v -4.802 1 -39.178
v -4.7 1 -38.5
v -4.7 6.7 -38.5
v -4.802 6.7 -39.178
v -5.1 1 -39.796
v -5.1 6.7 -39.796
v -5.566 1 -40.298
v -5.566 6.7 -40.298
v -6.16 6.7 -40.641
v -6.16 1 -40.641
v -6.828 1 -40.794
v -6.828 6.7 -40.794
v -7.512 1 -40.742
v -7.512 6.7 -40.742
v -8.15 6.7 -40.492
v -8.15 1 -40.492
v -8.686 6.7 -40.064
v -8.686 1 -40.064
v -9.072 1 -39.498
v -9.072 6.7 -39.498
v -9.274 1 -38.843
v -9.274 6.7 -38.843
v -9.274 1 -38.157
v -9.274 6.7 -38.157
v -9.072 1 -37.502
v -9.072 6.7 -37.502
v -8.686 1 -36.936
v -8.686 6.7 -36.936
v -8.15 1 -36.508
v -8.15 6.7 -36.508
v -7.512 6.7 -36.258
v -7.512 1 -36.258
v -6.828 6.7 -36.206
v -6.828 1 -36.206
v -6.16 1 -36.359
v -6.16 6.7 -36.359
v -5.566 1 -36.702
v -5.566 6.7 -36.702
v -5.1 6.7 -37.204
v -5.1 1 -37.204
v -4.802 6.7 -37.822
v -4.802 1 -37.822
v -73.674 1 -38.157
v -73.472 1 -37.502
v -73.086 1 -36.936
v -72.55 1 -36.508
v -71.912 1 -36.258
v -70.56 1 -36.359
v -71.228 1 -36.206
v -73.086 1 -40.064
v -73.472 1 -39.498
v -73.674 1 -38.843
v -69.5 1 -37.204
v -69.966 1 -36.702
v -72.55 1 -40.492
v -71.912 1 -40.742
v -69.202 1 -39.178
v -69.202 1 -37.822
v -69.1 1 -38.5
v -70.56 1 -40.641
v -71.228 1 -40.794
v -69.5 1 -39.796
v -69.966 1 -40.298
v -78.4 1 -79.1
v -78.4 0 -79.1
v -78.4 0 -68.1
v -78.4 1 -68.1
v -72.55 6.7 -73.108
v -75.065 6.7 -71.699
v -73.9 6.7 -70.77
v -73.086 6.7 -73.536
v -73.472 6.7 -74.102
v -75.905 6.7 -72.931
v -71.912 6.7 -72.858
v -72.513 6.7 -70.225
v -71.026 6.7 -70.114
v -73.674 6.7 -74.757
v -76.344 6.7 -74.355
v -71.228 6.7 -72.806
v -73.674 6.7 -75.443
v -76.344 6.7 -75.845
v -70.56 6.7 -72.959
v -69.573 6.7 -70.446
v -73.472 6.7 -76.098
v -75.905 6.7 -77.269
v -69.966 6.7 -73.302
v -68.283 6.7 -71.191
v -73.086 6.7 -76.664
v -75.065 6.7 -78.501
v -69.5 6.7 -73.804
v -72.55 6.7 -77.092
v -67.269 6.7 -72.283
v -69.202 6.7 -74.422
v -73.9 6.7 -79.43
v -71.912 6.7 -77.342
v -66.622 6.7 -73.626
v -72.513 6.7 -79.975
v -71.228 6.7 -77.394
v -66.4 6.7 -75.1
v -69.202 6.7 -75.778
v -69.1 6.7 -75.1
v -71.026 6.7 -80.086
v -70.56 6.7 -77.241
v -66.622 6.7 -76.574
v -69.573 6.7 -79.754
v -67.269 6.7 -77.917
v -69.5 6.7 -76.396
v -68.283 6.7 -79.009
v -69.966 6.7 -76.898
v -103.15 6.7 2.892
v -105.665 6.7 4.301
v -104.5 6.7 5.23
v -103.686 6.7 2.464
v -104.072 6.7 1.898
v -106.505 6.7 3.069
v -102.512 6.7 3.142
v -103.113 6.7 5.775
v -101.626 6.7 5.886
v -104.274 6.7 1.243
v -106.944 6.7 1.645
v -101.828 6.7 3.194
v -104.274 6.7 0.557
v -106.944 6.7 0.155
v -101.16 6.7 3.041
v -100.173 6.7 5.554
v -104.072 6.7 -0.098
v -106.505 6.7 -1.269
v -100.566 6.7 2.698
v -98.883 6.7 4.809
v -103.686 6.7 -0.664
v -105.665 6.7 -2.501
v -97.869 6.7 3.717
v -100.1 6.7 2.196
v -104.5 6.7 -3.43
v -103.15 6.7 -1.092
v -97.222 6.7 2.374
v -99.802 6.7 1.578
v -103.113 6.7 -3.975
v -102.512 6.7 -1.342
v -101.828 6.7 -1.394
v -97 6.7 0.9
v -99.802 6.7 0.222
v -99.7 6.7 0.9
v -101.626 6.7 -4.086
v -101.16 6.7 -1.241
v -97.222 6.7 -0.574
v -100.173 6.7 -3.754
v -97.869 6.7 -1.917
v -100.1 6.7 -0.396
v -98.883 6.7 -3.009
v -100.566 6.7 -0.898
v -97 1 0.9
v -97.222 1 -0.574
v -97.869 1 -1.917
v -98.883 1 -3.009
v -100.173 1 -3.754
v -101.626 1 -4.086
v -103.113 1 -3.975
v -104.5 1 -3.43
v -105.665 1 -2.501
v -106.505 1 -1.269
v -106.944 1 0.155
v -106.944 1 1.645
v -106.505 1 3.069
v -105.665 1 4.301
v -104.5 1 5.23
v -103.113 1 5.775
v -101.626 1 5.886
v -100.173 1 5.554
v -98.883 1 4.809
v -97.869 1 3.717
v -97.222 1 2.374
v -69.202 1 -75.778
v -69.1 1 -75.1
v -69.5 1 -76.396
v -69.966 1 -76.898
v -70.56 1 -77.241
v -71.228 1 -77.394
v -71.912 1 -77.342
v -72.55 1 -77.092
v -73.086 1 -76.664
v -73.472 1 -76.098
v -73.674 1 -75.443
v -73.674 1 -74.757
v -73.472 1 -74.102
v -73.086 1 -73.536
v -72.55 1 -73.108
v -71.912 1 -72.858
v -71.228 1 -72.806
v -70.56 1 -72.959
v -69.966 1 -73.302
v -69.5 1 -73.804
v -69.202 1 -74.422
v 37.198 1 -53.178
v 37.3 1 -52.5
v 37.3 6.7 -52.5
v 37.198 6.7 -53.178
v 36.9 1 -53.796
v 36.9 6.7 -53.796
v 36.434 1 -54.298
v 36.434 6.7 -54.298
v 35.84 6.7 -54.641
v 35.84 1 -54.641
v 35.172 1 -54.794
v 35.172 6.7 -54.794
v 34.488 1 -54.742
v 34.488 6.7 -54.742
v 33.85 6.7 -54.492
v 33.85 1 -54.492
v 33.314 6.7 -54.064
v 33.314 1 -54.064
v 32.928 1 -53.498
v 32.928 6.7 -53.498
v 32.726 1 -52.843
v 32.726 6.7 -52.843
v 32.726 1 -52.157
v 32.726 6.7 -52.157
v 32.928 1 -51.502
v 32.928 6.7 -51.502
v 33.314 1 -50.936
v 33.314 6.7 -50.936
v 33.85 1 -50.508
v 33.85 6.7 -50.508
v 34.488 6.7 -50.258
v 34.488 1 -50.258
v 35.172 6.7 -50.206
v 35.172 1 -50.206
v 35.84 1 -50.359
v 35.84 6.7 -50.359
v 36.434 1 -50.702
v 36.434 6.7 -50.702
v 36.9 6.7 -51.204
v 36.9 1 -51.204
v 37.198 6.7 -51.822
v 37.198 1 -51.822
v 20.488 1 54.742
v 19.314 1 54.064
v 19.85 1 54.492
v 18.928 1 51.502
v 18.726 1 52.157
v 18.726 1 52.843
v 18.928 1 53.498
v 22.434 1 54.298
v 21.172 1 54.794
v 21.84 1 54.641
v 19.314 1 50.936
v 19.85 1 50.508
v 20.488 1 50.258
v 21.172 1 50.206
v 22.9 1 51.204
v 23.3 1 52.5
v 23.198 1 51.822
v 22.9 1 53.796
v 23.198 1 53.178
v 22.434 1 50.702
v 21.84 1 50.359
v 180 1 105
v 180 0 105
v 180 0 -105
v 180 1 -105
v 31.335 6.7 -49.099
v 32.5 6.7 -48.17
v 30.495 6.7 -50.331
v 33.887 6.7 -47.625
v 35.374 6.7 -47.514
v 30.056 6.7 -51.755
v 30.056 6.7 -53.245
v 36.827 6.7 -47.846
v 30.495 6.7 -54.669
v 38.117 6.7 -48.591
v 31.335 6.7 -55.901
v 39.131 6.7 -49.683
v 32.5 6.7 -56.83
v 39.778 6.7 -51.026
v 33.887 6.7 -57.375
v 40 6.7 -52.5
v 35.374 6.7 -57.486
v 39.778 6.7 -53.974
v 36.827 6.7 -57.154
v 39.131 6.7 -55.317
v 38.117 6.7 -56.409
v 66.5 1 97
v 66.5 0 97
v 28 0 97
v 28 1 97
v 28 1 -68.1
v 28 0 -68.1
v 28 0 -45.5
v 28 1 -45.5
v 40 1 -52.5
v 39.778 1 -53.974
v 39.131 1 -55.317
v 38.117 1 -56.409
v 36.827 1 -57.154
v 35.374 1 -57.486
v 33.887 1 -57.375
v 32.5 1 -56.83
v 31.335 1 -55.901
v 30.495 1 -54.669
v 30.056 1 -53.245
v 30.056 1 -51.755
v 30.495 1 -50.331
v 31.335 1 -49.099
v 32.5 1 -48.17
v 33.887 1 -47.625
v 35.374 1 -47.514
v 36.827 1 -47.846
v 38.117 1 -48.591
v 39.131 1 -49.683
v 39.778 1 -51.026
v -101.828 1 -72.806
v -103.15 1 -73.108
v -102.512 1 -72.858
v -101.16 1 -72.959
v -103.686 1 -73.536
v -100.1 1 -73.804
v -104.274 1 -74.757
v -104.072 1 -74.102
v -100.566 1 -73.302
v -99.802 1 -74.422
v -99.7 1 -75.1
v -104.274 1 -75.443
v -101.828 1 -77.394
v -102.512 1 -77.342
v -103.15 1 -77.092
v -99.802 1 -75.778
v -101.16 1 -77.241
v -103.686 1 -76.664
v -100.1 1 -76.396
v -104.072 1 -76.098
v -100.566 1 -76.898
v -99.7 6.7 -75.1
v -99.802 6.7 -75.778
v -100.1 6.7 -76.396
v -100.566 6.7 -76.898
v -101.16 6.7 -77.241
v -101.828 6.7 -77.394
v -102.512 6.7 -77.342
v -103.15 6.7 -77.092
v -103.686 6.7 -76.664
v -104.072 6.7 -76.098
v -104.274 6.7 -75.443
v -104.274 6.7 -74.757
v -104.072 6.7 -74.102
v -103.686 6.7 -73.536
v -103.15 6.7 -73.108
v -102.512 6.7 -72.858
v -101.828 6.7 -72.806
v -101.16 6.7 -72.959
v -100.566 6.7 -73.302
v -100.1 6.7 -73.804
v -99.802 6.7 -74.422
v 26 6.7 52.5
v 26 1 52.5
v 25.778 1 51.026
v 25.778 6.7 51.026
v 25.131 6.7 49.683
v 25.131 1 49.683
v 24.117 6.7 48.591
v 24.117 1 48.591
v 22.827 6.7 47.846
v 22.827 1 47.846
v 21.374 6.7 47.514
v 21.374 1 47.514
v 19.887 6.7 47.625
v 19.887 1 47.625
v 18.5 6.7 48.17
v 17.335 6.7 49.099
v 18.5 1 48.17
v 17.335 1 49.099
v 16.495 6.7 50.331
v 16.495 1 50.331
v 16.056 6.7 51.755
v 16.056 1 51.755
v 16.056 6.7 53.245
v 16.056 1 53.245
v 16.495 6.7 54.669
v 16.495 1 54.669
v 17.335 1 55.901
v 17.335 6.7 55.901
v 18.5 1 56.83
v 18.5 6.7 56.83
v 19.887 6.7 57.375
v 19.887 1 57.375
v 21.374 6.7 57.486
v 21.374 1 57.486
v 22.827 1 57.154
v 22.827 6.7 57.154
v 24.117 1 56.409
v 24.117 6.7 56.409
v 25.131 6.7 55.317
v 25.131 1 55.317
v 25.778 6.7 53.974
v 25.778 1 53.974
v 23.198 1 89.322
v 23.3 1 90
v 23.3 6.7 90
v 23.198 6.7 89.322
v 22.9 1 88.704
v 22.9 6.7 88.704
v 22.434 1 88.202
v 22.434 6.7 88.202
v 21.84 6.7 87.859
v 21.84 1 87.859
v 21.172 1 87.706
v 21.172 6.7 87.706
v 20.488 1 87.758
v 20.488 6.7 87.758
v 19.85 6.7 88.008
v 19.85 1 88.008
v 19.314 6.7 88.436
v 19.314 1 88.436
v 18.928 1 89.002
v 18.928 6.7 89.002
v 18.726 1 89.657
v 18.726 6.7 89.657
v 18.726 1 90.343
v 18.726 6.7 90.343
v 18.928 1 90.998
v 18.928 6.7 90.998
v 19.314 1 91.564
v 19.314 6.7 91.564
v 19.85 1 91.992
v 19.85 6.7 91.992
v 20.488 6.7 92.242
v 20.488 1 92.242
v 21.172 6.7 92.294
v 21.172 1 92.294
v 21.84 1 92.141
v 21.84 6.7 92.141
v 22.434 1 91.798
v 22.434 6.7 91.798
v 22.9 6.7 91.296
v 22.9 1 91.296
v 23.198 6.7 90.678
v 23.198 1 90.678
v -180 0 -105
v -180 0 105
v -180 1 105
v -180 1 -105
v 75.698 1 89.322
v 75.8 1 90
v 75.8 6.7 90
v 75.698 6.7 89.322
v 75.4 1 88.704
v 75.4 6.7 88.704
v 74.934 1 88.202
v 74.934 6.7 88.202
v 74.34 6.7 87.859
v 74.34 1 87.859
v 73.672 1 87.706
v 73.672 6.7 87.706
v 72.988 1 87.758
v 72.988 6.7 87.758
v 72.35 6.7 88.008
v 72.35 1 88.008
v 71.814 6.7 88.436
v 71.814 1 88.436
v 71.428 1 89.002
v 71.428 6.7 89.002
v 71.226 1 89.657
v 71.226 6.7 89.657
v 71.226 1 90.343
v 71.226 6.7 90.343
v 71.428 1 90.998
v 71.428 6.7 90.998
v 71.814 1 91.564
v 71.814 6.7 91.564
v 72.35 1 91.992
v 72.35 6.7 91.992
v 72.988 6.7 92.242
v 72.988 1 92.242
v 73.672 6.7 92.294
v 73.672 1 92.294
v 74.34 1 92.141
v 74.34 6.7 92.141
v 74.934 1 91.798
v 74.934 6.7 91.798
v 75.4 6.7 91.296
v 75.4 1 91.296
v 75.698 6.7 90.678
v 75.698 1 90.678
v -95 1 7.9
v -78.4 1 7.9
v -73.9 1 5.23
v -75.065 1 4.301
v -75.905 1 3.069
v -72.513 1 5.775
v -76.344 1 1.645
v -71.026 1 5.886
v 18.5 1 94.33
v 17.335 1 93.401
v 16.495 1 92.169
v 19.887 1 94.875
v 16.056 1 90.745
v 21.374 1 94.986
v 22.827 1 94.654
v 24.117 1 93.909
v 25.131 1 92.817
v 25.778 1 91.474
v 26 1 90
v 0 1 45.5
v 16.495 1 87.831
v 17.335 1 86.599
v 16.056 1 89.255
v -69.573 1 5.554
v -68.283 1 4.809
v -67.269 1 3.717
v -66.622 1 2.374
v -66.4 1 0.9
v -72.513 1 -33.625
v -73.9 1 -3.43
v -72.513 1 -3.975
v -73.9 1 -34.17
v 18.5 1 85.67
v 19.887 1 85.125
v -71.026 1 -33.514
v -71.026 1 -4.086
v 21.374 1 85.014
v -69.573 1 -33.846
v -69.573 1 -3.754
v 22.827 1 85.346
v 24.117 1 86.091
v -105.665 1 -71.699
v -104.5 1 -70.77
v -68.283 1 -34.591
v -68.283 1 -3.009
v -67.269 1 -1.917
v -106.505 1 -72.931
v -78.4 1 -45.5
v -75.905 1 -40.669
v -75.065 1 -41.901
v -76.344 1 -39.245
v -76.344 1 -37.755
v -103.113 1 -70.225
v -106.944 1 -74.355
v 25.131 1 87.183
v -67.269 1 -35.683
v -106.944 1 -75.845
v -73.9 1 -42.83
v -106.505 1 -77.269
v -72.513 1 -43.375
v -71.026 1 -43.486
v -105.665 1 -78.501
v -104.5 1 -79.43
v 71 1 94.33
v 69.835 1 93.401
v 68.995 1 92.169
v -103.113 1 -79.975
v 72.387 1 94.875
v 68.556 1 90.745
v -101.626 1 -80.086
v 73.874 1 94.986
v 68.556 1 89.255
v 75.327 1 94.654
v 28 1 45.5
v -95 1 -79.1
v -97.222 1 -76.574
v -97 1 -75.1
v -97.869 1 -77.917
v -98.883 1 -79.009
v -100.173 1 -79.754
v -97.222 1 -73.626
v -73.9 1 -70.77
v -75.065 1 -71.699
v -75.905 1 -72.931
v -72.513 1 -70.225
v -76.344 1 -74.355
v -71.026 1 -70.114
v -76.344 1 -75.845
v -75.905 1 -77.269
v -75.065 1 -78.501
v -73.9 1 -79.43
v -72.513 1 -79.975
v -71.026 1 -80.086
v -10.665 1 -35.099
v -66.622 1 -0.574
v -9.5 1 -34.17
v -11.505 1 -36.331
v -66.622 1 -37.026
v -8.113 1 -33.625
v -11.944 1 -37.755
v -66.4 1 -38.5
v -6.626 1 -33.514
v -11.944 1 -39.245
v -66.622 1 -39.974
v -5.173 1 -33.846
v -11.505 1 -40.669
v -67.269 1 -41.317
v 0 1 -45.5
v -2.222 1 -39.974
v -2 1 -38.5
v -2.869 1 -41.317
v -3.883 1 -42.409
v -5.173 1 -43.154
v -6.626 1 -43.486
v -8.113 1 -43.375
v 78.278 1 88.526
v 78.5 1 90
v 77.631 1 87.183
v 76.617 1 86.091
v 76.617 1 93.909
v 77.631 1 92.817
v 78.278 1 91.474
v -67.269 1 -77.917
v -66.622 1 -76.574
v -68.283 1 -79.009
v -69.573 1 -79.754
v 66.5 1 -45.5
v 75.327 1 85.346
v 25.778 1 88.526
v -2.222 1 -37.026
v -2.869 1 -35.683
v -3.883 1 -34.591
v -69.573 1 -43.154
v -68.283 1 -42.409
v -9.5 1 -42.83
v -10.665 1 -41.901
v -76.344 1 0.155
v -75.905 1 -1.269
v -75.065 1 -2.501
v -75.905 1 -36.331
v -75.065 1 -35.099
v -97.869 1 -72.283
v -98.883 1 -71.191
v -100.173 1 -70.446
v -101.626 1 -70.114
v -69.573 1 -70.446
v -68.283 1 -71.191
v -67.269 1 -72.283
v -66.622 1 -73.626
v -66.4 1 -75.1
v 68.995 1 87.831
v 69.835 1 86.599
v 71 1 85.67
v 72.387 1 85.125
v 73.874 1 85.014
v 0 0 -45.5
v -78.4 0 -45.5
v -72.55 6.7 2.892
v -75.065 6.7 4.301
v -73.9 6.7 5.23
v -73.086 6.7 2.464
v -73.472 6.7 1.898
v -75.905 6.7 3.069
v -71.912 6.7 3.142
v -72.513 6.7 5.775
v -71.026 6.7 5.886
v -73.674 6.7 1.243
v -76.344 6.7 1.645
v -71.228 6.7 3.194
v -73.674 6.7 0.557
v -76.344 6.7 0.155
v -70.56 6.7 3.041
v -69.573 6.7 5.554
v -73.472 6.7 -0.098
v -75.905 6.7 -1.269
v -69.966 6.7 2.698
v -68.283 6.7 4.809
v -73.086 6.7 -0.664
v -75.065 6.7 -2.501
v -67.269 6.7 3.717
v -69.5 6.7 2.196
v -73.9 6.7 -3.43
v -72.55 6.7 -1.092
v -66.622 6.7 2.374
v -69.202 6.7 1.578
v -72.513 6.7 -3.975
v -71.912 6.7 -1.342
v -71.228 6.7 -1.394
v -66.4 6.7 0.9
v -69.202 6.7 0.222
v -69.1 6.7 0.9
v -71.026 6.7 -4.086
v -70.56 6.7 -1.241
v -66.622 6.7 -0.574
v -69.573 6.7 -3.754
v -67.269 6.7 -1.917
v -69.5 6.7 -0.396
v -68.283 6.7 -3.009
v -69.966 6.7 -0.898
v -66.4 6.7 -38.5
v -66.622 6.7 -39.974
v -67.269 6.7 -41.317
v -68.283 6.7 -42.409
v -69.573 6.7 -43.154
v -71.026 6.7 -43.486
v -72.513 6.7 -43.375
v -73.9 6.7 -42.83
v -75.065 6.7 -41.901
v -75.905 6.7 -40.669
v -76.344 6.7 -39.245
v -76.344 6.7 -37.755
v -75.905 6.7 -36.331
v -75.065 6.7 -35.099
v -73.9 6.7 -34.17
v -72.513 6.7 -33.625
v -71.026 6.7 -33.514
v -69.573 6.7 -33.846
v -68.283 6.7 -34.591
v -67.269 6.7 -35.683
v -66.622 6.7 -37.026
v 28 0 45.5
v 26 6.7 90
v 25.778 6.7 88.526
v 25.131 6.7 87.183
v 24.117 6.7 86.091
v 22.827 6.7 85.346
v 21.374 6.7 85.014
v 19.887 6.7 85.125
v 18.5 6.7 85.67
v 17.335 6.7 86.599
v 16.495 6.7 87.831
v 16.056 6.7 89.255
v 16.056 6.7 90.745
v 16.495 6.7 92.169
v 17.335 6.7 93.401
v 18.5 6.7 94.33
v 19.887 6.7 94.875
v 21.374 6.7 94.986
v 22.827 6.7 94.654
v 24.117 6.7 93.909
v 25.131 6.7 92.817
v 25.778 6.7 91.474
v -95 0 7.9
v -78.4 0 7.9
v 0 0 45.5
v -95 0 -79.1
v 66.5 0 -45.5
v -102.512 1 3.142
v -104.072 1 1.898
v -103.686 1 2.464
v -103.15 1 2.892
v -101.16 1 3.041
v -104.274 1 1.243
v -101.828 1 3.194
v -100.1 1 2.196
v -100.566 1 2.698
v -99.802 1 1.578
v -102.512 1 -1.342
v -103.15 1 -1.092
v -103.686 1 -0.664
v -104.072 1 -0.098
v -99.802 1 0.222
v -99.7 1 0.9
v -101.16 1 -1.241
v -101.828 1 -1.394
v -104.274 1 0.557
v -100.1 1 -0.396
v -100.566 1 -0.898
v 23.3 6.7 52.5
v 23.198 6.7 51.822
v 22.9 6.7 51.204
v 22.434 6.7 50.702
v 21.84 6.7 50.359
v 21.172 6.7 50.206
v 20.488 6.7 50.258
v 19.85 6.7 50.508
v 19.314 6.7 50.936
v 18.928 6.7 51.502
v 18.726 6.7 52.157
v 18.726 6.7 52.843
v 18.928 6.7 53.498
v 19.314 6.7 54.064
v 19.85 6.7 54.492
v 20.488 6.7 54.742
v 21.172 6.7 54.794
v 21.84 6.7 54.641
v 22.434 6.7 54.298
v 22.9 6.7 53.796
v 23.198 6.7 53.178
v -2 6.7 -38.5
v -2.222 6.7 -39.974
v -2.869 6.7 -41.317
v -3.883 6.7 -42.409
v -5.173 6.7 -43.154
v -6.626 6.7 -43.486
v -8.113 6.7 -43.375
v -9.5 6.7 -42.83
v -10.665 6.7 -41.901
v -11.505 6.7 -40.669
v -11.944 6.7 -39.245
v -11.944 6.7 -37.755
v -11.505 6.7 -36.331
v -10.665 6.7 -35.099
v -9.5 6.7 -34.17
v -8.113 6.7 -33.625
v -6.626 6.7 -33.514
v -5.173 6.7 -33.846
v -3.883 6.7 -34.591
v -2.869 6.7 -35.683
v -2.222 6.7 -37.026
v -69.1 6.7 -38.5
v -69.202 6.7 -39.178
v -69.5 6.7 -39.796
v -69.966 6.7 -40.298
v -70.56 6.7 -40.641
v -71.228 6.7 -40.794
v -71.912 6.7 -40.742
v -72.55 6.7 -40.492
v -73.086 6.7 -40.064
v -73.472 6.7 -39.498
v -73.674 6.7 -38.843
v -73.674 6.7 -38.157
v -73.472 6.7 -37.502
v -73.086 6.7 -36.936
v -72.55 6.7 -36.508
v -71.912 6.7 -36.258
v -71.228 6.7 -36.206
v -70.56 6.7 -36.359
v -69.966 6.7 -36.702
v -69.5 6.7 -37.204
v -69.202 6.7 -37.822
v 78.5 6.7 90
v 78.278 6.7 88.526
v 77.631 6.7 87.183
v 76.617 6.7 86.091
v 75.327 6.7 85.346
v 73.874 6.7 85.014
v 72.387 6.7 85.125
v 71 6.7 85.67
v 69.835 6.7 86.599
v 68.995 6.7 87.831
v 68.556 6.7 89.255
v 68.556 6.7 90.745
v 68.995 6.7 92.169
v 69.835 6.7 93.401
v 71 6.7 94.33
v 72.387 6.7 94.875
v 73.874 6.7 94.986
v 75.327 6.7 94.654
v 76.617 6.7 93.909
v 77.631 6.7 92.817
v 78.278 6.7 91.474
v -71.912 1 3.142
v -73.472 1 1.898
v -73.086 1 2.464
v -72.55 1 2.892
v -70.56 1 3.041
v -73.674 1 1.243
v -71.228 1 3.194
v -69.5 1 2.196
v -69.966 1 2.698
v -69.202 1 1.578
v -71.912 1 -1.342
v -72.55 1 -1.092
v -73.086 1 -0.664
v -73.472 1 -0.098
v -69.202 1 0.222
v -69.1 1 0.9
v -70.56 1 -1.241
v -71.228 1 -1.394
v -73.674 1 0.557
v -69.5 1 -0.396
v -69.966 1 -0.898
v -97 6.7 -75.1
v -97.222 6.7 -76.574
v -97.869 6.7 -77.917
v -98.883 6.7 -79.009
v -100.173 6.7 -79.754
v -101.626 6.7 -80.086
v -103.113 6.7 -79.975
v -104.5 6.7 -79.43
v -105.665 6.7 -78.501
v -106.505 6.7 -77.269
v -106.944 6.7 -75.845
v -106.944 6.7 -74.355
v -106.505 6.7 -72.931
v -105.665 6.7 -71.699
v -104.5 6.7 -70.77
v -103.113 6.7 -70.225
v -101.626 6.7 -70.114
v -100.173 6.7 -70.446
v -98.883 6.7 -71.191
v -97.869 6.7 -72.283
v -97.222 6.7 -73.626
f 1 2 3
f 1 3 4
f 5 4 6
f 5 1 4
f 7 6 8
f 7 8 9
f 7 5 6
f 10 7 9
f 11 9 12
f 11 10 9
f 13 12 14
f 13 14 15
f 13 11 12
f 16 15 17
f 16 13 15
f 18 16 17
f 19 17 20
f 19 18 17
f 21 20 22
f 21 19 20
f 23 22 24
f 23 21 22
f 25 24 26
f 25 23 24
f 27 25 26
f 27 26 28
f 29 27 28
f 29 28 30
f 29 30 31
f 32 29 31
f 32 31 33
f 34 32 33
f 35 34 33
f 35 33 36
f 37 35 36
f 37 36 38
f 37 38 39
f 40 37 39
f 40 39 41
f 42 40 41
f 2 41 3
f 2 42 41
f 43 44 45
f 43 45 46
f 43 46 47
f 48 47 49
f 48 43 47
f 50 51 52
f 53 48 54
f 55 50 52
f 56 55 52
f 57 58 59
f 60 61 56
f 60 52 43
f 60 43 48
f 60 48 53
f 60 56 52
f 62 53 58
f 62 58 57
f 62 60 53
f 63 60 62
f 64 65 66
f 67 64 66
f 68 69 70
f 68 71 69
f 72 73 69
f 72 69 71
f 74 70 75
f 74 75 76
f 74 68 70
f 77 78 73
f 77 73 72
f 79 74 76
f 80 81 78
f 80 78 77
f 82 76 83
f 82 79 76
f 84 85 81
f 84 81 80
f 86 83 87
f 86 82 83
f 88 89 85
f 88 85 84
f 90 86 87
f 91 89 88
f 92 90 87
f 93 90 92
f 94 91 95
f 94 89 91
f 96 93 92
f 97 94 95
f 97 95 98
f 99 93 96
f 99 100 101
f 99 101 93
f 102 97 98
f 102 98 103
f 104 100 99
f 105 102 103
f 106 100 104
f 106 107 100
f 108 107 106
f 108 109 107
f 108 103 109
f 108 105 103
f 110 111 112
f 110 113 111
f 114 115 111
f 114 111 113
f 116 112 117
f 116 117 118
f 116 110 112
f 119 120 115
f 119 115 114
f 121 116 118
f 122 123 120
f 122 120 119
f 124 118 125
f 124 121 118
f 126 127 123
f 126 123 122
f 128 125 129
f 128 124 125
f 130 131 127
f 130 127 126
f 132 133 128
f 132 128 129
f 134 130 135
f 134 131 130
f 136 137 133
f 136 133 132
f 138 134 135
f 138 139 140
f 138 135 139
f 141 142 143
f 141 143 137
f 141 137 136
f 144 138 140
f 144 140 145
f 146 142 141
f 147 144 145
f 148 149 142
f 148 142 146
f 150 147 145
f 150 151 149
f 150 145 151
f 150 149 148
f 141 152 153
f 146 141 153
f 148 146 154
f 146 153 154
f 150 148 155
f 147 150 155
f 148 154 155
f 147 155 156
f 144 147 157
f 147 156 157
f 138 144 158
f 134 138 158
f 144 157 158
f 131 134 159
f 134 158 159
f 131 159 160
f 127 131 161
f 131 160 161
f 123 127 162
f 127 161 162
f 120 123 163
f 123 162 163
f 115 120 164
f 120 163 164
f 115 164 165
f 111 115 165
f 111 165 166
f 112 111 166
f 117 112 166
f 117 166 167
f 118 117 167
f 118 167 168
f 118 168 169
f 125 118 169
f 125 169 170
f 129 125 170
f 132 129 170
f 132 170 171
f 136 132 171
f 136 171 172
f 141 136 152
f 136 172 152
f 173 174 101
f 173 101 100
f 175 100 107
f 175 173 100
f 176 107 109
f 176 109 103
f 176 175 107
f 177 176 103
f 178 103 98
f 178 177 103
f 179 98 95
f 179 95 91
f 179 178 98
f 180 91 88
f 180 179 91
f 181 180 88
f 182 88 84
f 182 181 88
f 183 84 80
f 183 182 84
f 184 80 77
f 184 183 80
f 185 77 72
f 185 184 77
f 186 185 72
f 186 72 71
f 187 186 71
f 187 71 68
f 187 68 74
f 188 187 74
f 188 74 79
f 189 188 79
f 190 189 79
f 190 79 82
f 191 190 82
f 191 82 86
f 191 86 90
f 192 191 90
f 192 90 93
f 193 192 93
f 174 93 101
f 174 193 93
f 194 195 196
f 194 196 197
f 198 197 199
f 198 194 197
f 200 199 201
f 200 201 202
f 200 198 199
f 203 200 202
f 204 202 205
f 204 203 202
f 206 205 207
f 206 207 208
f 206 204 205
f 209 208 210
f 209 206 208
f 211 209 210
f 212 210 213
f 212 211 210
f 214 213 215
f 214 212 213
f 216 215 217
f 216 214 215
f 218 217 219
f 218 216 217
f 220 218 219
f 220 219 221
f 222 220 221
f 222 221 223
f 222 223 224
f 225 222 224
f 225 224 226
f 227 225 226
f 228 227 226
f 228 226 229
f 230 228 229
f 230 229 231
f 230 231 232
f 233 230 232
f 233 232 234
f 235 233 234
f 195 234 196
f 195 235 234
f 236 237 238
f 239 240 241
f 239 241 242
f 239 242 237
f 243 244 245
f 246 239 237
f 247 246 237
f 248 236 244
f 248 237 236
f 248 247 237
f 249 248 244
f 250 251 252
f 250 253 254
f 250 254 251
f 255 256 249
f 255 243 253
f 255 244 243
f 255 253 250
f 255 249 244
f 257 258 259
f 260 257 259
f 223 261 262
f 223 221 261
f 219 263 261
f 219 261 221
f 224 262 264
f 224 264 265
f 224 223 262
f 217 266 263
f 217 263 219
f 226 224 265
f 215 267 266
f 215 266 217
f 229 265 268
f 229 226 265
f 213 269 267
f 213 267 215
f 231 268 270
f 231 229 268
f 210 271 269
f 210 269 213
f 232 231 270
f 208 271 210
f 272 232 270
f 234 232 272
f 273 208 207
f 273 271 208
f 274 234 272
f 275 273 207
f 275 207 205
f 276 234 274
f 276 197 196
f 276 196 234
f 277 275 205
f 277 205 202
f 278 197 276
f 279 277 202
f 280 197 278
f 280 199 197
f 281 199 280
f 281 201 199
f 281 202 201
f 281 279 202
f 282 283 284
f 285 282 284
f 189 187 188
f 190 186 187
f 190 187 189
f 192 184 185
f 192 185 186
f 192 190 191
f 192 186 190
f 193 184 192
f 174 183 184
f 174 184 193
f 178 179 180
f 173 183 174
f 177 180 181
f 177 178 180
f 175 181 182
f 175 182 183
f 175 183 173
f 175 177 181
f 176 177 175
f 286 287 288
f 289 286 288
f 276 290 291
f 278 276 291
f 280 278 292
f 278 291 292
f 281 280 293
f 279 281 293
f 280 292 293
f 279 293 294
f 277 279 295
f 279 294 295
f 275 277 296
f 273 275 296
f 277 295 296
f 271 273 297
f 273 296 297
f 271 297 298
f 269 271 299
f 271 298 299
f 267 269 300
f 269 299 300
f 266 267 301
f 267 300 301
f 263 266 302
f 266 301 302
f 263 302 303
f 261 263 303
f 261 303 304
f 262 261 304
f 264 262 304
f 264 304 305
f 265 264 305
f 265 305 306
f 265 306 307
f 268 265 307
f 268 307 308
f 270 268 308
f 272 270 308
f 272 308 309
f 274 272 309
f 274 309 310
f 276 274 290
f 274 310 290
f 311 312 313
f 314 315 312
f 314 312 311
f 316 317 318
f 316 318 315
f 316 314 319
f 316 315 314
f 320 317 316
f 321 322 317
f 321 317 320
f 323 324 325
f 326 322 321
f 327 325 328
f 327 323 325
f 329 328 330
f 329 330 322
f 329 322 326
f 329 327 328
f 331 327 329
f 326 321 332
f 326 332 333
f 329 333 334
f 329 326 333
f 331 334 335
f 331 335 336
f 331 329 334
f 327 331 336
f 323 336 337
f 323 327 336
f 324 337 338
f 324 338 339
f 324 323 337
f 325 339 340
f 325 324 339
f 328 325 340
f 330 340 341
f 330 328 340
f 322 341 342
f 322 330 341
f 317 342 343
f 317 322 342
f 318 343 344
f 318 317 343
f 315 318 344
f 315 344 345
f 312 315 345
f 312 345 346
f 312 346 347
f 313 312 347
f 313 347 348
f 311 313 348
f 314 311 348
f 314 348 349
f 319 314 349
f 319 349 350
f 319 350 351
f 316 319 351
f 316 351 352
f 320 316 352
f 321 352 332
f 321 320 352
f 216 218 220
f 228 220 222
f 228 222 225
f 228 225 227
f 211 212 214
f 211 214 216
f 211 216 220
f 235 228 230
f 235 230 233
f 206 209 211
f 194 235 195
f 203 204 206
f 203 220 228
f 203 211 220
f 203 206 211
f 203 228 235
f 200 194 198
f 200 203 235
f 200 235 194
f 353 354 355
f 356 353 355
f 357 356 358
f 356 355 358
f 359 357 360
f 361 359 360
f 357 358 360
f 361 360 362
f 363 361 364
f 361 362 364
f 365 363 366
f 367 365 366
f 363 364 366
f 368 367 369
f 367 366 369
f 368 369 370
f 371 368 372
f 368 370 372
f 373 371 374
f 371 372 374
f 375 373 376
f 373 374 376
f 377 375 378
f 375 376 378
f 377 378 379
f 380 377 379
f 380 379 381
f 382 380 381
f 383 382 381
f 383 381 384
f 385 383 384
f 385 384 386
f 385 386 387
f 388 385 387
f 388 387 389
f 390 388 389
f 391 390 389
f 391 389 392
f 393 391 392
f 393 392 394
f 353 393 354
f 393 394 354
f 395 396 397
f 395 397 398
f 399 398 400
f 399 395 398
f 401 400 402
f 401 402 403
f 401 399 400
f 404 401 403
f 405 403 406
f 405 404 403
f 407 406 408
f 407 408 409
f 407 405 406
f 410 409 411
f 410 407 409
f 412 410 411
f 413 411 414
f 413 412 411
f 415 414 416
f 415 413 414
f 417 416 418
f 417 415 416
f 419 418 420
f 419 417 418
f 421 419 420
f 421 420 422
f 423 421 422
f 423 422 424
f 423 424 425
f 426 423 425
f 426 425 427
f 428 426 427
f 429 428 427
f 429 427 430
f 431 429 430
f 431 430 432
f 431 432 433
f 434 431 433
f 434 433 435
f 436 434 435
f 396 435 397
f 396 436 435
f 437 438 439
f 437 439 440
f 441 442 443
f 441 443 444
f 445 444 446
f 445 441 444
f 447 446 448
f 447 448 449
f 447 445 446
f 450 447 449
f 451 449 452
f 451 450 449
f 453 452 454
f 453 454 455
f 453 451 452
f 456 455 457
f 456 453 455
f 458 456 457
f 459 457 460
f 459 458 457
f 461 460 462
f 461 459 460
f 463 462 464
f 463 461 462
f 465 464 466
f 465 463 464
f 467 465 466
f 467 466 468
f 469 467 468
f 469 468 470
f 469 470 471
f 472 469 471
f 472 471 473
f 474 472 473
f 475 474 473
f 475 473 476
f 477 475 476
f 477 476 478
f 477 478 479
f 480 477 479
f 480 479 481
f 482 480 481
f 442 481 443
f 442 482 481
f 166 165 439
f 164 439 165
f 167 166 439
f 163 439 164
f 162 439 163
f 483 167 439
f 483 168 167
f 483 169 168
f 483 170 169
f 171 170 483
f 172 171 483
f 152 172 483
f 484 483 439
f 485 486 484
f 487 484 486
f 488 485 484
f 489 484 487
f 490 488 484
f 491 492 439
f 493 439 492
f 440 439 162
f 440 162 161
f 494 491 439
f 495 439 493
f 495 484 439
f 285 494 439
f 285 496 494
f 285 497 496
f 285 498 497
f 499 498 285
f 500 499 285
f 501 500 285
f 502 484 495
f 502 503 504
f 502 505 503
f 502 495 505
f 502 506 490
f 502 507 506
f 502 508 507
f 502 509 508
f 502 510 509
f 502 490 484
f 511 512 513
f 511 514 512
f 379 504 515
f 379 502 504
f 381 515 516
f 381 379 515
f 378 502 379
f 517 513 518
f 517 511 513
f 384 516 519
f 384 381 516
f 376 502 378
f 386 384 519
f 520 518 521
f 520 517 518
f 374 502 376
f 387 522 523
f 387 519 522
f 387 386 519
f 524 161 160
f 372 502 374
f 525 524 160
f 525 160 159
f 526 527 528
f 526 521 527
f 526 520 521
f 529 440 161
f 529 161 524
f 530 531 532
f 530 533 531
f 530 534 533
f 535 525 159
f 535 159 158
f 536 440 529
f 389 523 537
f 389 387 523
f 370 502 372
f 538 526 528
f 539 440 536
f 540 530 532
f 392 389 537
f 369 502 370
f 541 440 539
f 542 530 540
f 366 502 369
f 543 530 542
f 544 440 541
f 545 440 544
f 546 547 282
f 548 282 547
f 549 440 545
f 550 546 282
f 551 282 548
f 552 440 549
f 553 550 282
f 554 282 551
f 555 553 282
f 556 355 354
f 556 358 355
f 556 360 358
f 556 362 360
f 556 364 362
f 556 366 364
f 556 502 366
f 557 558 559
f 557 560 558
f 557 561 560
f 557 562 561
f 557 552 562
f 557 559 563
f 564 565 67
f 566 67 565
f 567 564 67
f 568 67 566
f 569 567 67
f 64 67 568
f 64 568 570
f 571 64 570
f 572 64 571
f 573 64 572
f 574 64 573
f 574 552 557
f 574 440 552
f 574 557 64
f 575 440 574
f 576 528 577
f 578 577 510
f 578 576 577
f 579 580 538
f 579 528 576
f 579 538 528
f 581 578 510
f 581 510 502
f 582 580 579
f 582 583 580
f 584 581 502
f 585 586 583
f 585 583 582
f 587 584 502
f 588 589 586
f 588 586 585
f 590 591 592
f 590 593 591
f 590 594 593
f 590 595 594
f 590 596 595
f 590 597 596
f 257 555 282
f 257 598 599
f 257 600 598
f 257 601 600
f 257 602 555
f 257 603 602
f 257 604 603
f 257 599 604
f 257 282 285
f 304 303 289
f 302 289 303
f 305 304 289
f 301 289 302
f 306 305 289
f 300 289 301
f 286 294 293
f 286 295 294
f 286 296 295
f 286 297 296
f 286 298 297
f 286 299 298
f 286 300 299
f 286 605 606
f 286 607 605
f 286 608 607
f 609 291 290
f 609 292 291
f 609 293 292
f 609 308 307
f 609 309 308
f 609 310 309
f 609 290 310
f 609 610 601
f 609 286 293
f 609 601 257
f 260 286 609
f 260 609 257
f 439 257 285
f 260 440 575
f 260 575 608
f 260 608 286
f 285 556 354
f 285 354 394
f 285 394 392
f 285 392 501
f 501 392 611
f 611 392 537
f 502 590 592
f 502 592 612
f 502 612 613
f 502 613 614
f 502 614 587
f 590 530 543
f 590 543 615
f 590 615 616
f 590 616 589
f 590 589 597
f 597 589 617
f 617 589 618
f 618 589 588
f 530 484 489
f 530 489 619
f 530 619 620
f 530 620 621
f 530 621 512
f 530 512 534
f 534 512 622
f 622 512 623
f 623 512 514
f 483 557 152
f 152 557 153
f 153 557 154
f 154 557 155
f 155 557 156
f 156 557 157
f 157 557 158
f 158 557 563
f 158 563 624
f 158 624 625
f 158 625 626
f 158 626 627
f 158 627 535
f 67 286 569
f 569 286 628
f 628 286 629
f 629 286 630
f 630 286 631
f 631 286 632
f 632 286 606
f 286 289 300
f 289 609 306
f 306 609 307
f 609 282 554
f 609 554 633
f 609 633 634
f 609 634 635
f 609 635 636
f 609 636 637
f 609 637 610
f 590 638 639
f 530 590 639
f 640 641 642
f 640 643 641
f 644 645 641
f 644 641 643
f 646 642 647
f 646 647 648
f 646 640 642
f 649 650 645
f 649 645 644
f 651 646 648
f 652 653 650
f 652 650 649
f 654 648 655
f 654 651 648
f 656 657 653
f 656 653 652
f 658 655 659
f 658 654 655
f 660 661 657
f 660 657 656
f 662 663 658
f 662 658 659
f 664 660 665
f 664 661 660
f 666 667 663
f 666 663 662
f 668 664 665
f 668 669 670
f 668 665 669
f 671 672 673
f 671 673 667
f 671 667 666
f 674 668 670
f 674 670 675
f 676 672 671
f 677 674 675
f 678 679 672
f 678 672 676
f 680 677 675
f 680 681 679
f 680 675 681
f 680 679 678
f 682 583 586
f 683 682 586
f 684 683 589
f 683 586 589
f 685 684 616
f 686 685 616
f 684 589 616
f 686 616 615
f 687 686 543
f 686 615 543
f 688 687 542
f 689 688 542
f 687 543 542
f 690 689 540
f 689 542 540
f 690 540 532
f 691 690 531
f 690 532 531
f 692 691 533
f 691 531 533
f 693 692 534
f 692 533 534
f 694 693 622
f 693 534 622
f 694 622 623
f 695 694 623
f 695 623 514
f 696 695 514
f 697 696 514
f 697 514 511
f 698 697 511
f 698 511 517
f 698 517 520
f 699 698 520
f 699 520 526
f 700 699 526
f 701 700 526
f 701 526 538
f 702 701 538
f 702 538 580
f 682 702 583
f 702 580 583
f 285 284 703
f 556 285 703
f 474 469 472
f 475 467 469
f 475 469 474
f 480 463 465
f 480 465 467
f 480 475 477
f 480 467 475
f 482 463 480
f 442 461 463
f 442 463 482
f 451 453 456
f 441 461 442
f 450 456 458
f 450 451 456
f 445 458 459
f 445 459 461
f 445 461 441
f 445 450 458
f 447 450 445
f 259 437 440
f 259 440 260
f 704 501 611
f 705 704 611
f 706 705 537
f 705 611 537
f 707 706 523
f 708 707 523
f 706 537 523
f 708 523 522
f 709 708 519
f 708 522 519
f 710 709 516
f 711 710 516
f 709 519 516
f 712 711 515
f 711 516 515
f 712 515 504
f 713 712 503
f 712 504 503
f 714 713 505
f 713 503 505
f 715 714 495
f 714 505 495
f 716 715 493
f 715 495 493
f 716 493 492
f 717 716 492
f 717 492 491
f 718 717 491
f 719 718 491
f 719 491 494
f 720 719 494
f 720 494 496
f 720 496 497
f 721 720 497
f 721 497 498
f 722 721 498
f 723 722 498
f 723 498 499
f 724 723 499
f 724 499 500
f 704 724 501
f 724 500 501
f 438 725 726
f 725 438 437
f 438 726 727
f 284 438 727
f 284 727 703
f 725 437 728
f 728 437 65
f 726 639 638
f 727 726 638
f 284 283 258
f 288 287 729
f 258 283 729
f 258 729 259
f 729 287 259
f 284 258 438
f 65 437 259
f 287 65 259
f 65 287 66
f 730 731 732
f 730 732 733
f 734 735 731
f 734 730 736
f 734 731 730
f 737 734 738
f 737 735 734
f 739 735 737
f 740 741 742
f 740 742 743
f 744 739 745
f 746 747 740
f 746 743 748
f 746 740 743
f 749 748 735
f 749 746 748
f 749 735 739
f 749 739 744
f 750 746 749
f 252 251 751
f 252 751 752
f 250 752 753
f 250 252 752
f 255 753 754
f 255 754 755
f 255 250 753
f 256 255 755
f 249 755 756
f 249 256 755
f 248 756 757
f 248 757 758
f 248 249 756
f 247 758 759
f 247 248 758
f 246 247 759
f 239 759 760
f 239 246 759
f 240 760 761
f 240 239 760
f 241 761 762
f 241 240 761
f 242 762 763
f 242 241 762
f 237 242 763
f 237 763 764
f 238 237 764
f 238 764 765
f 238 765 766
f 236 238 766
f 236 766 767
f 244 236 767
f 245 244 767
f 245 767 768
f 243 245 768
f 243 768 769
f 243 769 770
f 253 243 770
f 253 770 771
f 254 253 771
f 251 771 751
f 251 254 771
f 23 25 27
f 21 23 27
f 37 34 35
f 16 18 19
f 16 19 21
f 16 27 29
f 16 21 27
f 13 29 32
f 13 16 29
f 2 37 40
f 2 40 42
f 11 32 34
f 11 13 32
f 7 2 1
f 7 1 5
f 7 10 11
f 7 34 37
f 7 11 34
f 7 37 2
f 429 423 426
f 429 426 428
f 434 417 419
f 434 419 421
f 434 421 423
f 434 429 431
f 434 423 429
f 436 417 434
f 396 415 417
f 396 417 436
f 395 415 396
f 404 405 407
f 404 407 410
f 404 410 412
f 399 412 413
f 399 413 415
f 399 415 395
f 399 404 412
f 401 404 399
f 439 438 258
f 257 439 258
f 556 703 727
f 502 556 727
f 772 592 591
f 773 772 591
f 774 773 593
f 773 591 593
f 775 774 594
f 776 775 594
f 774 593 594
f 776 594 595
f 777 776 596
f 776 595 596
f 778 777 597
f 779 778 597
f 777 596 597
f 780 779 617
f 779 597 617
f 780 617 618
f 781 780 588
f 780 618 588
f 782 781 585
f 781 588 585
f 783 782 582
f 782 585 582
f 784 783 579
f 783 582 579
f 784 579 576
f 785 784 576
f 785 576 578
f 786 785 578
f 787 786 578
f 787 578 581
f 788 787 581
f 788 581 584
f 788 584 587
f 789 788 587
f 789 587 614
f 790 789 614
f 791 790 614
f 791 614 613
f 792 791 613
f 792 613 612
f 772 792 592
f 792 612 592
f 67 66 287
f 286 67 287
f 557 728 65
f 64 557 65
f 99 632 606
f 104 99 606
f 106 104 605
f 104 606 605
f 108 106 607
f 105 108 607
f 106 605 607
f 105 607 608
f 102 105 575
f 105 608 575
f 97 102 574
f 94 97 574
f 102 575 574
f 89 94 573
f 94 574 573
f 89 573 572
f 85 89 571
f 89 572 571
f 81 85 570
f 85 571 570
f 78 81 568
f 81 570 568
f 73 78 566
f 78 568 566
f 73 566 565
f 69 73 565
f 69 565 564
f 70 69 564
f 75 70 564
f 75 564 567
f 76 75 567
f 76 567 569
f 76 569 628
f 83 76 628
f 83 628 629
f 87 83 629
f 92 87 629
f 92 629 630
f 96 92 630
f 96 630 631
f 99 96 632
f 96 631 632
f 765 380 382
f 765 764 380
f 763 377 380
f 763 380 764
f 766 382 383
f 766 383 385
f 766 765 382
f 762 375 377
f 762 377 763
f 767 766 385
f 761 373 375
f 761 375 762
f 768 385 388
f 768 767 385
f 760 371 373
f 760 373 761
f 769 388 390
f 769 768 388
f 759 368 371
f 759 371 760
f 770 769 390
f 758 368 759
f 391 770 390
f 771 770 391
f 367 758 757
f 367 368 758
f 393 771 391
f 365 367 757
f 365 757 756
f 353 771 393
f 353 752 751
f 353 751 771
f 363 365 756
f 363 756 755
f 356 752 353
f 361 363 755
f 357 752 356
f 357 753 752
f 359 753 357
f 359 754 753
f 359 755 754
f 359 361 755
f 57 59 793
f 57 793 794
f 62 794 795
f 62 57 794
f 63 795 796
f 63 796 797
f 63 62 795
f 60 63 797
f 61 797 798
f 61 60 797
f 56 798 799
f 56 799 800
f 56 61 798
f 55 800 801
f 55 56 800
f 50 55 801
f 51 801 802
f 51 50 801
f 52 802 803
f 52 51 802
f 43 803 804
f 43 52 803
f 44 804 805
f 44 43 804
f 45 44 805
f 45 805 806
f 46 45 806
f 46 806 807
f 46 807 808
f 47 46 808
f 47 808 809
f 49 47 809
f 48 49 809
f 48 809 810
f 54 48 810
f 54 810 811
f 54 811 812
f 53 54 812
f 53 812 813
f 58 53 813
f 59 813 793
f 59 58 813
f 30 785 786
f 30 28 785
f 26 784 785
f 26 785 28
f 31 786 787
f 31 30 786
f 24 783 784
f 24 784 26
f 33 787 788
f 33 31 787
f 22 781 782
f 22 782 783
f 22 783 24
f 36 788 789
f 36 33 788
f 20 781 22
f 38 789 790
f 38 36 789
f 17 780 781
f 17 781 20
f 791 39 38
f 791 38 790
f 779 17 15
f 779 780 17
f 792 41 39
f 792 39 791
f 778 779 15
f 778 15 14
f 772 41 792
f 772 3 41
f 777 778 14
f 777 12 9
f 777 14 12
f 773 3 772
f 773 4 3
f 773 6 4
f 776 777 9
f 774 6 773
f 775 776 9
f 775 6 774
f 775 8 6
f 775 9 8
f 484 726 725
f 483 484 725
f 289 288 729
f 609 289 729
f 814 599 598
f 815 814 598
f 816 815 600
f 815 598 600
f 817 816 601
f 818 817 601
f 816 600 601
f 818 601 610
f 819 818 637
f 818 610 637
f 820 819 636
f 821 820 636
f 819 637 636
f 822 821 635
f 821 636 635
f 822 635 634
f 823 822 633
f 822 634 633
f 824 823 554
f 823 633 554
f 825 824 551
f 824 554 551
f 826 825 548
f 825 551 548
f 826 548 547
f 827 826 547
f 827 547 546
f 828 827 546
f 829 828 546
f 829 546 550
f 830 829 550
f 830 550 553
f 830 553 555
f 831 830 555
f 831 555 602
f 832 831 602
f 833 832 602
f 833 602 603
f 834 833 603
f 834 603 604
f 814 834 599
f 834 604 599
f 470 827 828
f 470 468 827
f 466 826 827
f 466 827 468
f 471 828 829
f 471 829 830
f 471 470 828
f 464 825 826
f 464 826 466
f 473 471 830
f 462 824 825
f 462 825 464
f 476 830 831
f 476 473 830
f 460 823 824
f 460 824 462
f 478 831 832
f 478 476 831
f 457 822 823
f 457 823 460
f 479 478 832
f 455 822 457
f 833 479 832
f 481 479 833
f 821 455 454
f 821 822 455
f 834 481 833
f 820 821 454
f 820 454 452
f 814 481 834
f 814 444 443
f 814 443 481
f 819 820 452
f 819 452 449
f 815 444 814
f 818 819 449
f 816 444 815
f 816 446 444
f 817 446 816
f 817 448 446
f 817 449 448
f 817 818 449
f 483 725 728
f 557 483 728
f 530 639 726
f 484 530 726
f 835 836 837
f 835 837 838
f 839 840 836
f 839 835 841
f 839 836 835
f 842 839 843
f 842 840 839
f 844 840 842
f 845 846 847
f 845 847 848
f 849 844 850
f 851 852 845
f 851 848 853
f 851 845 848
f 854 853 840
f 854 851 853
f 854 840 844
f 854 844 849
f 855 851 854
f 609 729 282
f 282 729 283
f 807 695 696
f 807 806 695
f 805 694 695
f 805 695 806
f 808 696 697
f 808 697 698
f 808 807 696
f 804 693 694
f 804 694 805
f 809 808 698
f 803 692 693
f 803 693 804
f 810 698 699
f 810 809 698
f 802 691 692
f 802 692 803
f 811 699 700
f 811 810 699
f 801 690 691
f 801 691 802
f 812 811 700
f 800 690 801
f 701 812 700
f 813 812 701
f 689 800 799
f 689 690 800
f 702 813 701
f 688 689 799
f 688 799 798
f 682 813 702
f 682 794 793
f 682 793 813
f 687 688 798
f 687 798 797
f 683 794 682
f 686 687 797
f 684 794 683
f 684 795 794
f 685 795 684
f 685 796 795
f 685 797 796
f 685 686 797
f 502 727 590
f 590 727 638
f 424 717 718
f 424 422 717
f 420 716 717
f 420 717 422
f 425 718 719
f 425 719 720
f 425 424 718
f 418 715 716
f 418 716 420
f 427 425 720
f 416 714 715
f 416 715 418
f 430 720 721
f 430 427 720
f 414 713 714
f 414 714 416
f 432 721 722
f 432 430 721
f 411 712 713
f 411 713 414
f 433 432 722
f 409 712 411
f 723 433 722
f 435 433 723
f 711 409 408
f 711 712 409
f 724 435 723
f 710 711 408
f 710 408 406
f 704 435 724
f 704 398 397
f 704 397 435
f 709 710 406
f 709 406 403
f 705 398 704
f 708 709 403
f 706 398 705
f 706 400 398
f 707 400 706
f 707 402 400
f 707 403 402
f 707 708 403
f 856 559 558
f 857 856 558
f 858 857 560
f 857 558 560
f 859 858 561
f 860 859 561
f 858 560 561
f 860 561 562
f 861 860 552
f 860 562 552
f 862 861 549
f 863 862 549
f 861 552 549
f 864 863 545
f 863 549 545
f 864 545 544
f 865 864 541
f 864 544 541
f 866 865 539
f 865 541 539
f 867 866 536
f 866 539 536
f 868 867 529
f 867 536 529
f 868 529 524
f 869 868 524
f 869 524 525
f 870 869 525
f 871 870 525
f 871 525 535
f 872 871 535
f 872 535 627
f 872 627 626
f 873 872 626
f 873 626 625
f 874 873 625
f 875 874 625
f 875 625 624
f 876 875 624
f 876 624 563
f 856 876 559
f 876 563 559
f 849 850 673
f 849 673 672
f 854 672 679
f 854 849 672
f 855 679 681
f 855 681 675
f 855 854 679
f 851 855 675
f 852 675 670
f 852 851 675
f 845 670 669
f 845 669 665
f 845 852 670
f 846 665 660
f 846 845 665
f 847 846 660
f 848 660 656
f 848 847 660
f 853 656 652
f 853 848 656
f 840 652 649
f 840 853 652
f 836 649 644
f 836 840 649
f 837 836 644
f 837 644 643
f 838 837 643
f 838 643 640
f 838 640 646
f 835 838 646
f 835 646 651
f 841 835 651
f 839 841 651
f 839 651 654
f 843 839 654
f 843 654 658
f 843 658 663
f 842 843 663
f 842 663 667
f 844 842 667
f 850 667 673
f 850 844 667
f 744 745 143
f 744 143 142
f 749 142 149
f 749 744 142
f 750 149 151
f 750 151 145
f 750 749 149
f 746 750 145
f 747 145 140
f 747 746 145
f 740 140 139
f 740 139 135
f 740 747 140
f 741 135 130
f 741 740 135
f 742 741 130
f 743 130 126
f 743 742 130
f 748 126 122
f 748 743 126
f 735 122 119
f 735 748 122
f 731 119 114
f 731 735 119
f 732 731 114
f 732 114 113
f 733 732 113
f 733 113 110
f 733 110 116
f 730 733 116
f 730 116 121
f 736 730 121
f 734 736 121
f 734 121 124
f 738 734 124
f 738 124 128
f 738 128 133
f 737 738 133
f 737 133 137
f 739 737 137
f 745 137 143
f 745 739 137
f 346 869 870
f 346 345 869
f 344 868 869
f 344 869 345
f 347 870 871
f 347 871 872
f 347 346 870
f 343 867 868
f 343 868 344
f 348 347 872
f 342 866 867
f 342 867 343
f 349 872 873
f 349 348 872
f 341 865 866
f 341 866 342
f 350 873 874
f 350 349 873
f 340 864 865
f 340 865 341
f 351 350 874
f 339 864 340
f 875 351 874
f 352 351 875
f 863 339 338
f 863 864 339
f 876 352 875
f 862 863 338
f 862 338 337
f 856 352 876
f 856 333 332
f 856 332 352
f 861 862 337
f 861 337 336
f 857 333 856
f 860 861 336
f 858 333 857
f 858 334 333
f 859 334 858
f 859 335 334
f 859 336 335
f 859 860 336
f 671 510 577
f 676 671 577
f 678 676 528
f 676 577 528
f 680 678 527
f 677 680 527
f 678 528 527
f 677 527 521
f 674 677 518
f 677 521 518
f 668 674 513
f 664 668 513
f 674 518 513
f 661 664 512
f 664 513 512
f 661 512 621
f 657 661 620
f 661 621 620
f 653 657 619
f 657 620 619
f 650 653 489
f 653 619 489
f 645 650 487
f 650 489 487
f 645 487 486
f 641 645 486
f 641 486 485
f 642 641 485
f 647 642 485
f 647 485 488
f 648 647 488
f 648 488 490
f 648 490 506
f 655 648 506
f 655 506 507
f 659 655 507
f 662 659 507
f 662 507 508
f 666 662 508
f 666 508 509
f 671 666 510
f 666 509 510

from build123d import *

# Parameters (mm, degrees)
SKETCH1_W           = 360
SKETCH1_H           = 210
BOSS_EXTRUDE1_DEPTH = 1
SKETCH2_R           = 5
SKETCH2_R_2         = 2.3
BOSS_EXTRUDE2_DEPTH = 5.7


with BuildPart() as part:
    # Sketch1 → Boss-Extrude1 (new body)
    with BuildSketch(Plane(origin=(0, 0, 0), x_dir=(1, 0, 0), z_dir=(0, 1, 0))):
        Rectangle(SKETCH1_W, SKETCH1_H)
        Polygon((28, -45.5), (0, -45.5), (0, 45.5), (-78.4, 45.5), (-78.4, -7.9), (-95, -7.9), (-95, 79.1), (-78.4, 79.1), (-78.4, 68.1), (28, 68.1), (28, 45.5), (66.5, 45.5), (66.5, -45.5), (66.5, -97), (28, -97), align=None, mode=Mode.SUBTRACT)
    extrude(amount=BOSS_EXTRUDE1_DEPTH)

    # Sketch2 → Boss-Extrude2 (add)
    with BuildSketch(Plane(origin=(0, 1, 0), x_dir=(1, 0, 0), z_dir=(0, 1, 0))):
        with Locations((-71.4, 75.1)):
            Circle(SKETCH2_R)
        with Locations((-71.4, 75.1)):
            Circle(SKETCH2_R_2, mode=Mode.SUBTRACT)
        with Locations((-71.4, 38.5)):
            Circle(SKETCH2_R)
        with Locations((-71.4, 38.5)):
            Circle(SKETCH2_R_2, mode=Mode.SUBTRACT)
        with Locations((-102, 75.1)):
            Circle(SKETCH2_R)
        with Locations((-102, 75.1)):
            Circle(SKETCH2_R_2, mode=Mode.SUBTRACT)
        with Locations((-7, 38.5)):
            Circle(SKETCH2_R)
        with Locations((-7, 38.5)):
            Circle(SKETCH2_R_2, mode=Mode.SUBTRACT)
        with Locations((35, 52.5)):
            Circle(SKETCH2_R)
        with Locations((35, 52.5)):
            Circle(SKETCH2_R_2, mode=Mode.SUBTRACT)
        with Locations((21, -52.5)):
            Circle(SKETCH2_R)
        with Locations((21, -52.5)):
            Circle(SKETCH2_R_2, mode=Mode.SUBTRACT)
        with Locations((-71.4, -0.9)):
            Circle(SKETCH2_R)
        with Locations((-71.4, -0.9)):
            Circle(SKETCH2_R_2, mode=Mode.SUBTRACT)
        with Locations((-102, -0.9)):
            Circle(SKETCH2_R)
        with Locations((-102, -0.9)):
            Circle(SKETCH2_R_2, mode=Mode.SUBTRACT)
        with Locations((73.5, -90)):
            Circle(SKETCH2_R)
        with Locations((73.5, -90)):
            Circle(SKETCH2_R_2, mode=Mode.SUBTRACT)
        with Locations((21, -90)):
            Circle(SKETCH2_R)
        with Locations((21, -90)):
            Circle(SKETCH2_R_2, mode=Mode.SUBTRACT)
    extrude(amount=BOSS_EXTRUDE2_DEPTH)


solid = part.part
